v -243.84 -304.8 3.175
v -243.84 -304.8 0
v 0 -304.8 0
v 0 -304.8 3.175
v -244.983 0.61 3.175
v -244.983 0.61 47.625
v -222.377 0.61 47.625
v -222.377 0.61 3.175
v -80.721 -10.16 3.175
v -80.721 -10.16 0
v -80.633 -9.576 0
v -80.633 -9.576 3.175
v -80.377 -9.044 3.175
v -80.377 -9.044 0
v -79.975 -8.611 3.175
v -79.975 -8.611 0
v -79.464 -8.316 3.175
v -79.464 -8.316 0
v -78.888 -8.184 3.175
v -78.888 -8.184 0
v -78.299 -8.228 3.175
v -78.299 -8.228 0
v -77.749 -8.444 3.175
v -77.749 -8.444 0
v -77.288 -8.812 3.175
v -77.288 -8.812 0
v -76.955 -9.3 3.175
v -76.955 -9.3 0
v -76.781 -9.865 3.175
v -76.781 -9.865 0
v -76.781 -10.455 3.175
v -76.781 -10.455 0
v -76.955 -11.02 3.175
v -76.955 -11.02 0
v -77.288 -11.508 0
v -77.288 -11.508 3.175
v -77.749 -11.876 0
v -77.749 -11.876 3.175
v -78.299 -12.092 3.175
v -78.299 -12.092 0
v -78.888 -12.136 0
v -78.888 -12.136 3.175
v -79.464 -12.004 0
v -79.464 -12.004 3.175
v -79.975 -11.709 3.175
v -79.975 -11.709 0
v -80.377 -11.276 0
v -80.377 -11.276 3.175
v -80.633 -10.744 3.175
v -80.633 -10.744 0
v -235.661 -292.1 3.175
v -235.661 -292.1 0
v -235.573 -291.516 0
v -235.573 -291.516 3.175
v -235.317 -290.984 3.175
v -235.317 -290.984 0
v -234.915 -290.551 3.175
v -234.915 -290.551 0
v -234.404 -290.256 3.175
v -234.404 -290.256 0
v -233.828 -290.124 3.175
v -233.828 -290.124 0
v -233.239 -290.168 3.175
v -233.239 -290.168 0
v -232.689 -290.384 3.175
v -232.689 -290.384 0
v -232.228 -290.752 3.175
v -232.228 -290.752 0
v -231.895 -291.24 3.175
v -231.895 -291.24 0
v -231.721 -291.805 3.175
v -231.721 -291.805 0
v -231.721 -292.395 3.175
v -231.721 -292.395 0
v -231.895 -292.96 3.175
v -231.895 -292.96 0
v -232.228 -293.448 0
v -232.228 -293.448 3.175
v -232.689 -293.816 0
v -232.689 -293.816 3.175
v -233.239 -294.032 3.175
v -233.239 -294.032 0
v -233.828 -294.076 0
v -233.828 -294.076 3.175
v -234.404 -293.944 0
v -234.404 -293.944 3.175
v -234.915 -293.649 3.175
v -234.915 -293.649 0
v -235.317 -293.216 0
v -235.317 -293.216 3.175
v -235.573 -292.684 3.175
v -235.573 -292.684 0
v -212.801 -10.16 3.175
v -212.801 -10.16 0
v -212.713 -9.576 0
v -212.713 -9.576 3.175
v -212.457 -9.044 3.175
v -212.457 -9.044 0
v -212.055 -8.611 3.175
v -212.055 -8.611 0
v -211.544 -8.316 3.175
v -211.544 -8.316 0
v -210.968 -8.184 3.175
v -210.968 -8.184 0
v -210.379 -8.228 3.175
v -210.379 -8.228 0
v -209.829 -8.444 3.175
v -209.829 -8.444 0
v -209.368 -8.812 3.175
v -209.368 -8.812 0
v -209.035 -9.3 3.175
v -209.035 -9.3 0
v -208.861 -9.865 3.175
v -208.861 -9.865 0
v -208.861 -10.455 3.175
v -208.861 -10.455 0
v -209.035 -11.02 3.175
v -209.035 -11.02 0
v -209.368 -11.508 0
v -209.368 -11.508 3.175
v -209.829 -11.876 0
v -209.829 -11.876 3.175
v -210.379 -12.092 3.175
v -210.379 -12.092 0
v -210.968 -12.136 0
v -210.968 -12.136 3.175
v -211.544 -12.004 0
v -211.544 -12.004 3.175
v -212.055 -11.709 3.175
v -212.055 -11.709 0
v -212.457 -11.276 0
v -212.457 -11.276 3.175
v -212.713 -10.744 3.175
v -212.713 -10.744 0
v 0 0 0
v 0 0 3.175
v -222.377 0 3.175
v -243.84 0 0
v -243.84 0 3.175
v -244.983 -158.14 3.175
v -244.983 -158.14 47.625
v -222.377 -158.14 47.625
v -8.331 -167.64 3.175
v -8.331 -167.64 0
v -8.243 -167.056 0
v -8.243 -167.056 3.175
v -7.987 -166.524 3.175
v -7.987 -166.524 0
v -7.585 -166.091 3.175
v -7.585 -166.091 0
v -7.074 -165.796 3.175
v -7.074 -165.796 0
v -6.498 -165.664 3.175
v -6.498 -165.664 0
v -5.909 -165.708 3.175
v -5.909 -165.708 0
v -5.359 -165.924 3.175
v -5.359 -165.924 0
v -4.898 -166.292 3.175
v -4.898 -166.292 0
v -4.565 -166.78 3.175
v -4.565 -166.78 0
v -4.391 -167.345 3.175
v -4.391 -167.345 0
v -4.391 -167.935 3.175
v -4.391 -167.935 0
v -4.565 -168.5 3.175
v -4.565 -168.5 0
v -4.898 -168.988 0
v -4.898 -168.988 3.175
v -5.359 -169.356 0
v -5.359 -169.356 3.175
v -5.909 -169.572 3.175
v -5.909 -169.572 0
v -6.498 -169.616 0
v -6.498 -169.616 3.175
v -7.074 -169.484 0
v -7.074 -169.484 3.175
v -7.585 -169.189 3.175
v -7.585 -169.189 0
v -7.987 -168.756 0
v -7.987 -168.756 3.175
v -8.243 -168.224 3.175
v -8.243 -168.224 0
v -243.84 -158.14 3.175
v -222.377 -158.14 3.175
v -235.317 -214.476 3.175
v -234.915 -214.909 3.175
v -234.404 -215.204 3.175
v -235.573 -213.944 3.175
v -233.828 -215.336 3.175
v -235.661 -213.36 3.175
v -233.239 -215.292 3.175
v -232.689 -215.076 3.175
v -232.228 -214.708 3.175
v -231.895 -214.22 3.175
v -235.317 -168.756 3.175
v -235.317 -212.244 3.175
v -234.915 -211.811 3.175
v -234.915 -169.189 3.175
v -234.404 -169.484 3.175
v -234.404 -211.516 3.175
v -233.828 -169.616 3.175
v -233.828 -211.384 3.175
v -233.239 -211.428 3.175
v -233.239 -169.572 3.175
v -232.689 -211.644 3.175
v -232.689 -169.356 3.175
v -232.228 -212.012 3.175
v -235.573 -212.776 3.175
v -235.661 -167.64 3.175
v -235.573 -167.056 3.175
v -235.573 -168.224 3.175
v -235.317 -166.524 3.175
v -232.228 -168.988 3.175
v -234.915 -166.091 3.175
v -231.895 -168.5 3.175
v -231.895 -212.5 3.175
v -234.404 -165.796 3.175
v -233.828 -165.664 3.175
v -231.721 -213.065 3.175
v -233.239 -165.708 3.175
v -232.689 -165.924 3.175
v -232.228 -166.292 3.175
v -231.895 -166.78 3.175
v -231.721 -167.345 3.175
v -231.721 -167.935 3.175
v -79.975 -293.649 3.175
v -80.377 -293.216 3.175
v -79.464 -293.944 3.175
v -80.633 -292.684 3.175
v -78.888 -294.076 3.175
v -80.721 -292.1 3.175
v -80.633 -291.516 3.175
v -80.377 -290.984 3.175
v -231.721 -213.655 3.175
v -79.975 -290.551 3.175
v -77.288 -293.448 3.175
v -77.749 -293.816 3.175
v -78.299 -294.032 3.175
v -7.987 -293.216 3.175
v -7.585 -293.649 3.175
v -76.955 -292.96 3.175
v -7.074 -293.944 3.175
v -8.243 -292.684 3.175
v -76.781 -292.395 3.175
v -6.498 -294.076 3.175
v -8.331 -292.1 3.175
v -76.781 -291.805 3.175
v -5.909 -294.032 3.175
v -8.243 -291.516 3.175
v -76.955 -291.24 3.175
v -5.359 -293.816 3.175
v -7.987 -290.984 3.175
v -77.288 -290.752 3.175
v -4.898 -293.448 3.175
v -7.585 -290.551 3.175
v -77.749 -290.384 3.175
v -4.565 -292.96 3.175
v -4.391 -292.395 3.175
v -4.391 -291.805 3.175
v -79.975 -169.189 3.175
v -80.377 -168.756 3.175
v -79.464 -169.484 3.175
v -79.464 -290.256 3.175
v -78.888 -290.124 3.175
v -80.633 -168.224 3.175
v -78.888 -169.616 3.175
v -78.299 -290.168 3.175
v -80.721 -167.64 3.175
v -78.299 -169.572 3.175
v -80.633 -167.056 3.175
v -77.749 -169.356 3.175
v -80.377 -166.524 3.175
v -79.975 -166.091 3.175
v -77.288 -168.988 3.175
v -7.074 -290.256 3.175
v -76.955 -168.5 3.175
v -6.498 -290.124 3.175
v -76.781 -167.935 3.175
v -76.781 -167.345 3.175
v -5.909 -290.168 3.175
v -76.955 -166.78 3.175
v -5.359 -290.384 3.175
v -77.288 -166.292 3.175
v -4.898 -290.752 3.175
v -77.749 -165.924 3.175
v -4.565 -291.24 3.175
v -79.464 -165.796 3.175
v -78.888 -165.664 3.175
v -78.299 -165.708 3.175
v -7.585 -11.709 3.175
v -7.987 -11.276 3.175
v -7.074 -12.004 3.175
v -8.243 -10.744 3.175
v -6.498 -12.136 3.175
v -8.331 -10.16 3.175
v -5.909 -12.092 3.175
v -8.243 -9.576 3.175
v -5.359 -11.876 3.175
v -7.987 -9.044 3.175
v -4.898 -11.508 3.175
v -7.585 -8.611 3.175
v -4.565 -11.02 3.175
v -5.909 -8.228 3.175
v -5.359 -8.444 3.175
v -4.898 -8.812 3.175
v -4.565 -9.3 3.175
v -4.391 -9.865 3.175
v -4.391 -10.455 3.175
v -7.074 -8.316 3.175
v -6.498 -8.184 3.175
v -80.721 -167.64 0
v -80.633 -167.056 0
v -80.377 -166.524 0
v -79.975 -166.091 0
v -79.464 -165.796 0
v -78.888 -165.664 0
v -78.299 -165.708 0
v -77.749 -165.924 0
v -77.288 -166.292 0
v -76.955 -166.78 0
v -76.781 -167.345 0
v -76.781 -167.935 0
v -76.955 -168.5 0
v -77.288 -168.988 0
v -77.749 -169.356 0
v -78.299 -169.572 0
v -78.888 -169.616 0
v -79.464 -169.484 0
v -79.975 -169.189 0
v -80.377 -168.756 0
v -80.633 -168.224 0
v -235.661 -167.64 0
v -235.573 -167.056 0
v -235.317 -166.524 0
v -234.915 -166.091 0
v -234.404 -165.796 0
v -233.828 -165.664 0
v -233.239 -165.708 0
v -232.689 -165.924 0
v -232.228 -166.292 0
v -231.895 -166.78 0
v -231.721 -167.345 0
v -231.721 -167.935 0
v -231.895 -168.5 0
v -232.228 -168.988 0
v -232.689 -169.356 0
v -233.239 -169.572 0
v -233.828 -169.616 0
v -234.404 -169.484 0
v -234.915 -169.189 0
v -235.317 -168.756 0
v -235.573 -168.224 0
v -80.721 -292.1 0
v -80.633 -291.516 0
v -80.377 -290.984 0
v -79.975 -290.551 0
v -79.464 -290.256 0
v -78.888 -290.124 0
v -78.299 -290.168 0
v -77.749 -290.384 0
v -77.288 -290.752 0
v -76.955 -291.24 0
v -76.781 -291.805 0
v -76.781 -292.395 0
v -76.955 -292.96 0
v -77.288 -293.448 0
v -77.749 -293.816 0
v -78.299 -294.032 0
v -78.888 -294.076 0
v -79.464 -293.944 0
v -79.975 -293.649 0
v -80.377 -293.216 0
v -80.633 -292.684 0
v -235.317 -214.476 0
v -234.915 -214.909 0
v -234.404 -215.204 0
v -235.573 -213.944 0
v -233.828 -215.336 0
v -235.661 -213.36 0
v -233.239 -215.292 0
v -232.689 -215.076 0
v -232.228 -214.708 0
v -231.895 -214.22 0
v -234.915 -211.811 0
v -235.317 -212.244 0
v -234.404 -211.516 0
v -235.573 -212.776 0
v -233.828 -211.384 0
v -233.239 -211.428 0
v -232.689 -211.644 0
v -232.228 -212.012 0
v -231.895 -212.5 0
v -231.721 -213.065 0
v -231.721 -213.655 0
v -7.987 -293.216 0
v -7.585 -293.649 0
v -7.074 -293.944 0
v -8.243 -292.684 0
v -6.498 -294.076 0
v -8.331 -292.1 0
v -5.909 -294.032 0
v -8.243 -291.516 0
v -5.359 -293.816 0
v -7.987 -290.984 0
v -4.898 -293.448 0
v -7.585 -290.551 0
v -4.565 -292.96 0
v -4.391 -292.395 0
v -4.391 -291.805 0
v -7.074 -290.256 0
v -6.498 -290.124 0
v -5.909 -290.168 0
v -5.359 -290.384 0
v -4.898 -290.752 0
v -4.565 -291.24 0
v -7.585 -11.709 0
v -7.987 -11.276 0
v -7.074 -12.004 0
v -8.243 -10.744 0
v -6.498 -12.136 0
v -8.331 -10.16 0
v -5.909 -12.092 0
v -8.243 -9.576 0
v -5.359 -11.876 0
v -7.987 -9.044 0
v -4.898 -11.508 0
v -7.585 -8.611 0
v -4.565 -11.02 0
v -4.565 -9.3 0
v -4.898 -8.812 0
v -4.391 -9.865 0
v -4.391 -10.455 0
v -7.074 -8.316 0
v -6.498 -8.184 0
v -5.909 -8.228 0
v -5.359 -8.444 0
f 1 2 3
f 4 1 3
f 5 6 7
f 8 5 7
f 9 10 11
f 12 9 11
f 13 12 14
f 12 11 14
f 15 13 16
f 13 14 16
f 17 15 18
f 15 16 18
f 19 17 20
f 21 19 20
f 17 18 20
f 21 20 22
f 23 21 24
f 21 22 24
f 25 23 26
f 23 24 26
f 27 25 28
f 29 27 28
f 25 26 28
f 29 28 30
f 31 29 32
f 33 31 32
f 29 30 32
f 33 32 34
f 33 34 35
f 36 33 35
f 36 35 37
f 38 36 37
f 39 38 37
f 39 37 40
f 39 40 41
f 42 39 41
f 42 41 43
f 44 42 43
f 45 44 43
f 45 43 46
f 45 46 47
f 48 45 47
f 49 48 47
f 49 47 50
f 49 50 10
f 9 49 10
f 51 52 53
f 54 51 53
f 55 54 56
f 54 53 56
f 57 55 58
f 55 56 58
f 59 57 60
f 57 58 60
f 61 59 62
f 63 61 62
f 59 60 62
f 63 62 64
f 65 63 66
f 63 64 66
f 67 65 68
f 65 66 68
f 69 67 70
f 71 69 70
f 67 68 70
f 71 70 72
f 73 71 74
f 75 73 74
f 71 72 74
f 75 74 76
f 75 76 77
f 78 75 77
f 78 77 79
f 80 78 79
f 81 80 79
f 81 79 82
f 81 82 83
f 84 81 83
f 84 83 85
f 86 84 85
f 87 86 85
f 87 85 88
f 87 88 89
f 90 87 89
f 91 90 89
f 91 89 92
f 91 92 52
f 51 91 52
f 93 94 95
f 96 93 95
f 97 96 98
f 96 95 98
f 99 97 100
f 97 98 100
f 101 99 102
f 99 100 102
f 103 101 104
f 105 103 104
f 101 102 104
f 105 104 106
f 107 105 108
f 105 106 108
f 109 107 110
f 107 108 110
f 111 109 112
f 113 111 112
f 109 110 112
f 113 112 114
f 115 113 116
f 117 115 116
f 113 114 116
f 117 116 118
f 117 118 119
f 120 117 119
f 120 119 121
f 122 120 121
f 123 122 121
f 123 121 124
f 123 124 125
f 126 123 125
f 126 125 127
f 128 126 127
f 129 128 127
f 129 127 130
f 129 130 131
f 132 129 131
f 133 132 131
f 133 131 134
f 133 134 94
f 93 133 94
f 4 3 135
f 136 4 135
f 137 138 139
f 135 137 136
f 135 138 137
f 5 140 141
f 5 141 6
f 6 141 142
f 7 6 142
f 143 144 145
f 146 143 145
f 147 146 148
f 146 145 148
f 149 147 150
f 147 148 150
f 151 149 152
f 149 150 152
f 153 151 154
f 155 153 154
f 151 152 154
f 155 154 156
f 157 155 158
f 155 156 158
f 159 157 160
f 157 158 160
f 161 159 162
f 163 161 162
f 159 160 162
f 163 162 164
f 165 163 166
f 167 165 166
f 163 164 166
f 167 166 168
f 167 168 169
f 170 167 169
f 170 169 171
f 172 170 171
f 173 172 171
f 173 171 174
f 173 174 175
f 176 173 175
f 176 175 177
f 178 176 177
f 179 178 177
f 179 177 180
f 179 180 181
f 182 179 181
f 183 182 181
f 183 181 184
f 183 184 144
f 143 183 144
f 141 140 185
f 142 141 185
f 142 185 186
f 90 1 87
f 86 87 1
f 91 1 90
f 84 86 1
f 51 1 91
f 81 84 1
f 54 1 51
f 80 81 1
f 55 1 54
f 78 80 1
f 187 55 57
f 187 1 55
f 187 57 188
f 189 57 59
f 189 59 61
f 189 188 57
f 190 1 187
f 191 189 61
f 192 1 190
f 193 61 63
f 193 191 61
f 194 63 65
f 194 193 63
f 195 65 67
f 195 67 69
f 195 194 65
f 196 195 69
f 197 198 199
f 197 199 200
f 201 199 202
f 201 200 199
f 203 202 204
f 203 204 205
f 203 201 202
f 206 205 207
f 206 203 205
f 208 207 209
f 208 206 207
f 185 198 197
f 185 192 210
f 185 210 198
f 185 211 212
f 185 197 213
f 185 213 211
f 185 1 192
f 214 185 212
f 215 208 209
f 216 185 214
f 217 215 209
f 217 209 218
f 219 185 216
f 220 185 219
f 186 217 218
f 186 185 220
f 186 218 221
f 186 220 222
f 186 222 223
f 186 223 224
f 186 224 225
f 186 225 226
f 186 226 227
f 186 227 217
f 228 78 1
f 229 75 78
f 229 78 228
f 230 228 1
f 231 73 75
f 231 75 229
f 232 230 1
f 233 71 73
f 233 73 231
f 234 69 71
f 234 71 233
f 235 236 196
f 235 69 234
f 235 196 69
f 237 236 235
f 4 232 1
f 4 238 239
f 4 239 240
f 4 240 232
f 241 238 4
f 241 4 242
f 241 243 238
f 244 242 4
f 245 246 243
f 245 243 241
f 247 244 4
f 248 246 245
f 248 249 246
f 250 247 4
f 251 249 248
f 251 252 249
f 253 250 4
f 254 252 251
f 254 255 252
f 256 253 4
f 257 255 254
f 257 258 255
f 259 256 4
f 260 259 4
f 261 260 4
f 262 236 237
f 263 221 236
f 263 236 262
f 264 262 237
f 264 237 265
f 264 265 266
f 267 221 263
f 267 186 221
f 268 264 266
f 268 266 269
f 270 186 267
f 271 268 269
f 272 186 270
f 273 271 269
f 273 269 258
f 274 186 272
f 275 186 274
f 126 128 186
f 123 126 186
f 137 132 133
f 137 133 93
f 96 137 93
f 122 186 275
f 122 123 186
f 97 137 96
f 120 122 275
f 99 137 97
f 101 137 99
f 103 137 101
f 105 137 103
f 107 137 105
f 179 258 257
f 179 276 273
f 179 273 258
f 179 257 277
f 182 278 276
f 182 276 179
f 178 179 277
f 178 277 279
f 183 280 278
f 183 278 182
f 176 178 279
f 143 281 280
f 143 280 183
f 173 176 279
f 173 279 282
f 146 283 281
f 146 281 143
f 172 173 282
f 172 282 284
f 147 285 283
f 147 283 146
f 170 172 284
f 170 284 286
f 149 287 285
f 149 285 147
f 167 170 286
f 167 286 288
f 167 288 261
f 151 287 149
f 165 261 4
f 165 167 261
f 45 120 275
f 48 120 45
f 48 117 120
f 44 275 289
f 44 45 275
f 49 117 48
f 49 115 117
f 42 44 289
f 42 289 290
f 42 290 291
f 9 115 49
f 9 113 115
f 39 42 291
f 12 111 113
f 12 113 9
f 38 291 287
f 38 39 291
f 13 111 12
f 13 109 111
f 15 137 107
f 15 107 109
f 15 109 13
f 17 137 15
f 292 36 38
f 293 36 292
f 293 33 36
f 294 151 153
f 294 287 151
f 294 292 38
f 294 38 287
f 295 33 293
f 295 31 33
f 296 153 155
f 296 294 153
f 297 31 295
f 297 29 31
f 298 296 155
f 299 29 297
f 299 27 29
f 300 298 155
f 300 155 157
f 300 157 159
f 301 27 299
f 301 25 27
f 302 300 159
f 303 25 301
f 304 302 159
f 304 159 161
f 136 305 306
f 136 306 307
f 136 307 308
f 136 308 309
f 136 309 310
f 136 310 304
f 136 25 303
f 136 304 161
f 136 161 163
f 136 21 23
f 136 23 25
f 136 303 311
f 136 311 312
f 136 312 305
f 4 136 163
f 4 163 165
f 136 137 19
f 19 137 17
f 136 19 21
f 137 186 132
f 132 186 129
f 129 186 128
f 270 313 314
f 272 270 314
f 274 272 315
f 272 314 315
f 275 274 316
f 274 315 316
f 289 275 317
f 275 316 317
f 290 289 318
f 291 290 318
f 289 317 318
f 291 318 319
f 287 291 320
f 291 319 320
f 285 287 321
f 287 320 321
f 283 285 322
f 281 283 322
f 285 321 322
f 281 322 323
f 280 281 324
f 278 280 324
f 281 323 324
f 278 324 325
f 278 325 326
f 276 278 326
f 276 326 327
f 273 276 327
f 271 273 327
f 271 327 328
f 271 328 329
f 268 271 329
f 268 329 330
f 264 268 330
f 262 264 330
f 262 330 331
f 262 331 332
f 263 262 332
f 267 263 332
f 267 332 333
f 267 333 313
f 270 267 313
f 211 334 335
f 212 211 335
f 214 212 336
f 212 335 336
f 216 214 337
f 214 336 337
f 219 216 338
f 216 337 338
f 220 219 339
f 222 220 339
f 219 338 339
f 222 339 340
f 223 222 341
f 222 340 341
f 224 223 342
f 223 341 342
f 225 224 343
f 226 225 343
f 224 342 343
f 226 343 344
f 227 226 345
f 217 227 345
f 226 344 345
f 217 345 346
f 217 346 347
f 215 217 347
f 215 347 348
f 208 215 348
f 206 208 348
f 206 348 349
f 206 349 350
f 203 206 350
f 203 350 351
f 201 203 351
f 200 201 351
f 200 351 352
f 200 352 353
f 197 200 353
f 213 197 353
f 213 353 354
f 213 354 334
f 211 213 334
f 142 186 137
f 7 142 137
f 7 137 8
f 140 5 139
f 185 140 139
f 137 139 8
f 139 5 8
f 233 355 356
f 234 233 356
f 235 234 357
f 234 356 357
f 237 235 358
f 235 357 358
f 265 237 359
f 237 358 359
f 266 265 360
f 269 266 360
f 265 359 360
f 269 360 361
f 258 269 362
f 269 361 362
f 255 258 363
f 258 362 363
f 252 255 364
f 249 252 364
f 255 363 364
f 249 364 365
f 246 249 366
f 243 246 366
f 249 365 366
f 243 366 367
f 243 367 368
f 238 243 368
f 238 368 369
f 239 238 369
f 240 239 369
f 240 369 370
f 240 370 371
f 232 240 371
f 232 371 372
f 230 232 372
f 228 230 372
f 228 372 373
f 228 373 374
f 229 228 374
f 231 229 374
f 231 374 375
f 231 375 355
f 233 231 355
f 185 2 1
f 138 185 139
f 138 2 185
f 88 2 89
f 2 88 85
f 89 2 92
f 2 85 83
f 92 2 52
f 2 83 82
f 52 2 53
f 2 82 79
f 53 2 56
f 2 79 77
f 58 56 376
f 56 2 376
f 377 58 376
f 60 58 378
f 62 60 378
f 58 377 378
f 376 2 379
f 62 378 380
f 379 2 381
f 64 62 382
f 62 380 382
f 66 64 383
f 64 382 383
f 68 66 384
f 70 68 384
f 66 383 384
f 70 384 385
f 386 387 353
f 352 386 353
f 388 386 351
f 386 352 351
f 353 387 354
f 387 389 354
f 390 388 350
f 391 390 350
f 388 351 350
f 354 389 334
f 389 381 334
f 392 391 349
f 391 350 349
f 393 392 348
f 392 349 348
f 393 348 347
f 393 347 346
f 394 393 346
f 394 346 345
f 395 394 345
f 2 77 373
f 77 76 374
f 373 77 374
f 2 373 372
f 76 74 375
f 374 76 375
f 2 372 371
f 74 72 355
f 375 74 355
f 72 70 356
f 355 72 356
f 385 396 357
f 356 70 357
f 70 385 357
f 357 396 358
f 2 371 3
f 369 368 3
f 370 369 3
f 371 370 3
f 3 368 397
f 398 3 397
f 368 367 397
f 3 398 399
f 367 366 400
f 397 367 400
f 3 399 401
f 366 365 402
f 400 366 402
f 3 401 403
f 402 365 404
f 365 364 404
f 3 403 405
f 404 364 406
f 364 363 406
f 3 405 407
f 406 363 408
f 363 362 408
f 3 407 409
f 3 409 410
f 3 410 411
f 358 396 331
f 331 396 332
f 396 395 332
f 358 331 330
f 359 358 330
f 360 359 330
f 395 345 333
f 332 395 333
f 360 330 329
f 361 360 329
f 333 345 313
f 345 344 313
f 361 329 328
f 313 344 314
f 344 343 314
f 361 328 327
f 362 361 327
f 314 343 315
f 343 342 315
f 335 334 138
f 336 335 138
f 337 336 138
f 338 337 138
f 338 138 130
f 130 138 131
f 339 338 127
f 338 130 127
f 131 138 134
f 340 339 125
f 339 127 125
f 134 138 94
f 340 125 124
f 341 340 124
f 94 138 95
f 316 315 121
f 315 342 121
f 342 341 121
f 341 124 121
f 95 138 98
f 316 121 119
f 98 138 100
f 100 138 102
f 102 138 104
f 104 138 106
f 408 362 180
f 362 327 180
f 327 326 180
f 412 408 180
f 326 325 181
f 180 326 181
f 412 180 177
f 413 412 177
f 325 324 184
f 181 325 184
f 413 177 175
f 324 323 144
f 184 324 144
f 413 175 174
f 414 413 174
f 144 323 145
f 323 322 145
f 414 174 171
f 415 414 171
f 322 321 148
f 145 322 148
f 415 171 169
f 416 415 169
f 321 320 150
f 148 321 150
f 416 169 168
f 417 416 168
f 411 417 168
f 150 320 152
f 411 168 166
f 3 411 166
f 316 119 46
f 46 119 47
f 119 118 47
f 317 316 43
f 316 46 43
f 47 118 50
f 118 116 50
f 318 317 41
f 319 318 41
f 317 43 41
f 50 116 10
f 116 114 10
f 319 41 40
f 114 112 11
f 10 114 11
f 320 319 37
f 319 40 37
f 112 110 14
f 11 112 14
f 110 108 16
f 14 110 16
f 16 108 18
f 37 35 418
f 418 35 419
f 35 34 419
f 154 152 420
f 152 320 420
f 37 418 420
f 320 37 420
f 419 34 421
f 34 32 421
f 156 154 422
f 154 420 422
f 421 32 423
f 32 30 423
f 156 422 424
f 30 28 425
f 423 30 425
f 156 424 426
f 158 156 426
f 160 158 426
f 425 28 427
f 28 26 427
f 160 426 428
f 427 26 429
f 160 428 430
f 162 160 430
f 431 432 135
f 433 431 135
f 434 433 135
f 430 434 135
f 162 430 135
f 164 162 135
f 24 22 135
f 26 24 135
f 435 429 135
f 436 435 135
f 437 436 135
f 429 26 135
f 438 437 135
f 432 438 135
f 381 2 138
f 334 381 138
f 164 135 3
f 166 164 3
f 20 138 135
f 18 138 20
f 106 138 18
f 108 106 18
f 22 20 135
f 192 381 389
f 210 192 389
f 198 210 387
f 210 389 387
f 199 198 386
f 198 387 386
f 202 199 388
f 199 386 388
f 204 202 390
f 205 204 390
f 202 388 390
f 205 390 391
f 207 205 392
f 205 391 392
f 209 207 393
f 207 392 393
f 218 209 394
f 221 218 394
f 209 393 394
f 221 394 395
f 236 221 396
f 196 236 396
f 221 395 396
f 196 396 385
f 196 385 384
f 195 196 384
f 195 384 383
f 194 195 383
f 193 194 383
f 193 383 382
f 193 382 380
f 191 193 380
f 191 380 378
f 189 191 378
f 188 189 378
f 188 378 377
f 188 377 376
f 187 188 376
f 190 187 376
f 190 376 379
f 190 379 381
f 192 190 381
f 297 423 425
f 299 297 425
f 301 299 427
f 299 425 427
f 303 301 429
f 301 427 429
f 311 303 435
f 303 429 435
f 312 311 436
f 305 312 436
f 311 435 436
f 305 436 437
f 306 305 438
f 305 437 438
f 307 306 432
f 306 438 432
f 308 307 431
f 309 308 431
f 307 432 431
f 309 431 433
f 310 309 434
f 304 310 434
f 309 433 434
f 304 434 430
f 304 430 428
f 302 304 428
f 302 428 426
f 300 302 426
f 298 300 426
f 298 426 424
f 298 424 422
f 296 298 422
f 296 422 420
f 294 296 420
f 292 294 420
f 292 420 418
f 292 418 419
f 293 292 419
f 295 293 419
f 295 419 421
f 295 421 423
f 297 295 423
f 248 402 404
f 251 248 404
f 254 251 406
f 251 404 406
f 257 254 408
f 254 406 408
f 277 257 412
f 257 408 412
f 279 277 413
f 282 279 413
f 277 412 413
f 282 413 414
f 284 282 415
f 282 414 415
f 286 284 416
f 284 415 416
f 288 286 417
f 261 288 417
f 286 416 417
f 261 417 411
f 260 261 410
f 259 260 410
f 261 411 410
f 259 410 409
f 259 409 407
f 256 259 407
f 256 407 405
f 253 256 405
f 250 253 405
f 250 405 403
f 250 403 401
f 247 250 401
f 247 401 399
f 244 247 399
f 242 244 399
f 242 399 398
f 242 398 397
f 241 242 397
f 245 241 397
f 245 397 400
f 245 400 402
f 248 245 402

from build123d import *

# Parameters (mm, degrees)
F0_W     = 243.84
F0_H     = 304.8
F1_DEPTH = 3.175
F3_D     = 3.9624
F4_W     = 22.606
F4_H     = 158.75
F5_DEPTH = 44.45


with BuildPart() as f1:
    # F0 (on Top) → F1 (new body)
    with BuildSketch(Plane.XY):
        with Locations((-121.92, -152.4)):
            Rectangle(F0_W, F0_H)
    extrude(amount=F1_DEPTH)

    # F3 (through all)
    with Locations(Plane.XY.offset(3.175)):
        with Locations((-78.74, -10.16), (-210.82, -10.16), (-6.35, -10.16), (-78.74, -292.1), (-78.74, -167.64), (-6.35, -292.1), (-233.68, -167.64), (-233.68, -292.1), (-6.35, -167.64), (-233.68, -213.36)):
            Hole(F3_D / 2)

    # F4 (on face) → F5 (join)
    with BuildSketch(Plane.XY.offset(3.175)):
        with Locations((-233.68, -78.7654)):
            Rectangle(F4_W, F4_H)
    extrude(amount=F5_DEPTH)


solid = f1.part
